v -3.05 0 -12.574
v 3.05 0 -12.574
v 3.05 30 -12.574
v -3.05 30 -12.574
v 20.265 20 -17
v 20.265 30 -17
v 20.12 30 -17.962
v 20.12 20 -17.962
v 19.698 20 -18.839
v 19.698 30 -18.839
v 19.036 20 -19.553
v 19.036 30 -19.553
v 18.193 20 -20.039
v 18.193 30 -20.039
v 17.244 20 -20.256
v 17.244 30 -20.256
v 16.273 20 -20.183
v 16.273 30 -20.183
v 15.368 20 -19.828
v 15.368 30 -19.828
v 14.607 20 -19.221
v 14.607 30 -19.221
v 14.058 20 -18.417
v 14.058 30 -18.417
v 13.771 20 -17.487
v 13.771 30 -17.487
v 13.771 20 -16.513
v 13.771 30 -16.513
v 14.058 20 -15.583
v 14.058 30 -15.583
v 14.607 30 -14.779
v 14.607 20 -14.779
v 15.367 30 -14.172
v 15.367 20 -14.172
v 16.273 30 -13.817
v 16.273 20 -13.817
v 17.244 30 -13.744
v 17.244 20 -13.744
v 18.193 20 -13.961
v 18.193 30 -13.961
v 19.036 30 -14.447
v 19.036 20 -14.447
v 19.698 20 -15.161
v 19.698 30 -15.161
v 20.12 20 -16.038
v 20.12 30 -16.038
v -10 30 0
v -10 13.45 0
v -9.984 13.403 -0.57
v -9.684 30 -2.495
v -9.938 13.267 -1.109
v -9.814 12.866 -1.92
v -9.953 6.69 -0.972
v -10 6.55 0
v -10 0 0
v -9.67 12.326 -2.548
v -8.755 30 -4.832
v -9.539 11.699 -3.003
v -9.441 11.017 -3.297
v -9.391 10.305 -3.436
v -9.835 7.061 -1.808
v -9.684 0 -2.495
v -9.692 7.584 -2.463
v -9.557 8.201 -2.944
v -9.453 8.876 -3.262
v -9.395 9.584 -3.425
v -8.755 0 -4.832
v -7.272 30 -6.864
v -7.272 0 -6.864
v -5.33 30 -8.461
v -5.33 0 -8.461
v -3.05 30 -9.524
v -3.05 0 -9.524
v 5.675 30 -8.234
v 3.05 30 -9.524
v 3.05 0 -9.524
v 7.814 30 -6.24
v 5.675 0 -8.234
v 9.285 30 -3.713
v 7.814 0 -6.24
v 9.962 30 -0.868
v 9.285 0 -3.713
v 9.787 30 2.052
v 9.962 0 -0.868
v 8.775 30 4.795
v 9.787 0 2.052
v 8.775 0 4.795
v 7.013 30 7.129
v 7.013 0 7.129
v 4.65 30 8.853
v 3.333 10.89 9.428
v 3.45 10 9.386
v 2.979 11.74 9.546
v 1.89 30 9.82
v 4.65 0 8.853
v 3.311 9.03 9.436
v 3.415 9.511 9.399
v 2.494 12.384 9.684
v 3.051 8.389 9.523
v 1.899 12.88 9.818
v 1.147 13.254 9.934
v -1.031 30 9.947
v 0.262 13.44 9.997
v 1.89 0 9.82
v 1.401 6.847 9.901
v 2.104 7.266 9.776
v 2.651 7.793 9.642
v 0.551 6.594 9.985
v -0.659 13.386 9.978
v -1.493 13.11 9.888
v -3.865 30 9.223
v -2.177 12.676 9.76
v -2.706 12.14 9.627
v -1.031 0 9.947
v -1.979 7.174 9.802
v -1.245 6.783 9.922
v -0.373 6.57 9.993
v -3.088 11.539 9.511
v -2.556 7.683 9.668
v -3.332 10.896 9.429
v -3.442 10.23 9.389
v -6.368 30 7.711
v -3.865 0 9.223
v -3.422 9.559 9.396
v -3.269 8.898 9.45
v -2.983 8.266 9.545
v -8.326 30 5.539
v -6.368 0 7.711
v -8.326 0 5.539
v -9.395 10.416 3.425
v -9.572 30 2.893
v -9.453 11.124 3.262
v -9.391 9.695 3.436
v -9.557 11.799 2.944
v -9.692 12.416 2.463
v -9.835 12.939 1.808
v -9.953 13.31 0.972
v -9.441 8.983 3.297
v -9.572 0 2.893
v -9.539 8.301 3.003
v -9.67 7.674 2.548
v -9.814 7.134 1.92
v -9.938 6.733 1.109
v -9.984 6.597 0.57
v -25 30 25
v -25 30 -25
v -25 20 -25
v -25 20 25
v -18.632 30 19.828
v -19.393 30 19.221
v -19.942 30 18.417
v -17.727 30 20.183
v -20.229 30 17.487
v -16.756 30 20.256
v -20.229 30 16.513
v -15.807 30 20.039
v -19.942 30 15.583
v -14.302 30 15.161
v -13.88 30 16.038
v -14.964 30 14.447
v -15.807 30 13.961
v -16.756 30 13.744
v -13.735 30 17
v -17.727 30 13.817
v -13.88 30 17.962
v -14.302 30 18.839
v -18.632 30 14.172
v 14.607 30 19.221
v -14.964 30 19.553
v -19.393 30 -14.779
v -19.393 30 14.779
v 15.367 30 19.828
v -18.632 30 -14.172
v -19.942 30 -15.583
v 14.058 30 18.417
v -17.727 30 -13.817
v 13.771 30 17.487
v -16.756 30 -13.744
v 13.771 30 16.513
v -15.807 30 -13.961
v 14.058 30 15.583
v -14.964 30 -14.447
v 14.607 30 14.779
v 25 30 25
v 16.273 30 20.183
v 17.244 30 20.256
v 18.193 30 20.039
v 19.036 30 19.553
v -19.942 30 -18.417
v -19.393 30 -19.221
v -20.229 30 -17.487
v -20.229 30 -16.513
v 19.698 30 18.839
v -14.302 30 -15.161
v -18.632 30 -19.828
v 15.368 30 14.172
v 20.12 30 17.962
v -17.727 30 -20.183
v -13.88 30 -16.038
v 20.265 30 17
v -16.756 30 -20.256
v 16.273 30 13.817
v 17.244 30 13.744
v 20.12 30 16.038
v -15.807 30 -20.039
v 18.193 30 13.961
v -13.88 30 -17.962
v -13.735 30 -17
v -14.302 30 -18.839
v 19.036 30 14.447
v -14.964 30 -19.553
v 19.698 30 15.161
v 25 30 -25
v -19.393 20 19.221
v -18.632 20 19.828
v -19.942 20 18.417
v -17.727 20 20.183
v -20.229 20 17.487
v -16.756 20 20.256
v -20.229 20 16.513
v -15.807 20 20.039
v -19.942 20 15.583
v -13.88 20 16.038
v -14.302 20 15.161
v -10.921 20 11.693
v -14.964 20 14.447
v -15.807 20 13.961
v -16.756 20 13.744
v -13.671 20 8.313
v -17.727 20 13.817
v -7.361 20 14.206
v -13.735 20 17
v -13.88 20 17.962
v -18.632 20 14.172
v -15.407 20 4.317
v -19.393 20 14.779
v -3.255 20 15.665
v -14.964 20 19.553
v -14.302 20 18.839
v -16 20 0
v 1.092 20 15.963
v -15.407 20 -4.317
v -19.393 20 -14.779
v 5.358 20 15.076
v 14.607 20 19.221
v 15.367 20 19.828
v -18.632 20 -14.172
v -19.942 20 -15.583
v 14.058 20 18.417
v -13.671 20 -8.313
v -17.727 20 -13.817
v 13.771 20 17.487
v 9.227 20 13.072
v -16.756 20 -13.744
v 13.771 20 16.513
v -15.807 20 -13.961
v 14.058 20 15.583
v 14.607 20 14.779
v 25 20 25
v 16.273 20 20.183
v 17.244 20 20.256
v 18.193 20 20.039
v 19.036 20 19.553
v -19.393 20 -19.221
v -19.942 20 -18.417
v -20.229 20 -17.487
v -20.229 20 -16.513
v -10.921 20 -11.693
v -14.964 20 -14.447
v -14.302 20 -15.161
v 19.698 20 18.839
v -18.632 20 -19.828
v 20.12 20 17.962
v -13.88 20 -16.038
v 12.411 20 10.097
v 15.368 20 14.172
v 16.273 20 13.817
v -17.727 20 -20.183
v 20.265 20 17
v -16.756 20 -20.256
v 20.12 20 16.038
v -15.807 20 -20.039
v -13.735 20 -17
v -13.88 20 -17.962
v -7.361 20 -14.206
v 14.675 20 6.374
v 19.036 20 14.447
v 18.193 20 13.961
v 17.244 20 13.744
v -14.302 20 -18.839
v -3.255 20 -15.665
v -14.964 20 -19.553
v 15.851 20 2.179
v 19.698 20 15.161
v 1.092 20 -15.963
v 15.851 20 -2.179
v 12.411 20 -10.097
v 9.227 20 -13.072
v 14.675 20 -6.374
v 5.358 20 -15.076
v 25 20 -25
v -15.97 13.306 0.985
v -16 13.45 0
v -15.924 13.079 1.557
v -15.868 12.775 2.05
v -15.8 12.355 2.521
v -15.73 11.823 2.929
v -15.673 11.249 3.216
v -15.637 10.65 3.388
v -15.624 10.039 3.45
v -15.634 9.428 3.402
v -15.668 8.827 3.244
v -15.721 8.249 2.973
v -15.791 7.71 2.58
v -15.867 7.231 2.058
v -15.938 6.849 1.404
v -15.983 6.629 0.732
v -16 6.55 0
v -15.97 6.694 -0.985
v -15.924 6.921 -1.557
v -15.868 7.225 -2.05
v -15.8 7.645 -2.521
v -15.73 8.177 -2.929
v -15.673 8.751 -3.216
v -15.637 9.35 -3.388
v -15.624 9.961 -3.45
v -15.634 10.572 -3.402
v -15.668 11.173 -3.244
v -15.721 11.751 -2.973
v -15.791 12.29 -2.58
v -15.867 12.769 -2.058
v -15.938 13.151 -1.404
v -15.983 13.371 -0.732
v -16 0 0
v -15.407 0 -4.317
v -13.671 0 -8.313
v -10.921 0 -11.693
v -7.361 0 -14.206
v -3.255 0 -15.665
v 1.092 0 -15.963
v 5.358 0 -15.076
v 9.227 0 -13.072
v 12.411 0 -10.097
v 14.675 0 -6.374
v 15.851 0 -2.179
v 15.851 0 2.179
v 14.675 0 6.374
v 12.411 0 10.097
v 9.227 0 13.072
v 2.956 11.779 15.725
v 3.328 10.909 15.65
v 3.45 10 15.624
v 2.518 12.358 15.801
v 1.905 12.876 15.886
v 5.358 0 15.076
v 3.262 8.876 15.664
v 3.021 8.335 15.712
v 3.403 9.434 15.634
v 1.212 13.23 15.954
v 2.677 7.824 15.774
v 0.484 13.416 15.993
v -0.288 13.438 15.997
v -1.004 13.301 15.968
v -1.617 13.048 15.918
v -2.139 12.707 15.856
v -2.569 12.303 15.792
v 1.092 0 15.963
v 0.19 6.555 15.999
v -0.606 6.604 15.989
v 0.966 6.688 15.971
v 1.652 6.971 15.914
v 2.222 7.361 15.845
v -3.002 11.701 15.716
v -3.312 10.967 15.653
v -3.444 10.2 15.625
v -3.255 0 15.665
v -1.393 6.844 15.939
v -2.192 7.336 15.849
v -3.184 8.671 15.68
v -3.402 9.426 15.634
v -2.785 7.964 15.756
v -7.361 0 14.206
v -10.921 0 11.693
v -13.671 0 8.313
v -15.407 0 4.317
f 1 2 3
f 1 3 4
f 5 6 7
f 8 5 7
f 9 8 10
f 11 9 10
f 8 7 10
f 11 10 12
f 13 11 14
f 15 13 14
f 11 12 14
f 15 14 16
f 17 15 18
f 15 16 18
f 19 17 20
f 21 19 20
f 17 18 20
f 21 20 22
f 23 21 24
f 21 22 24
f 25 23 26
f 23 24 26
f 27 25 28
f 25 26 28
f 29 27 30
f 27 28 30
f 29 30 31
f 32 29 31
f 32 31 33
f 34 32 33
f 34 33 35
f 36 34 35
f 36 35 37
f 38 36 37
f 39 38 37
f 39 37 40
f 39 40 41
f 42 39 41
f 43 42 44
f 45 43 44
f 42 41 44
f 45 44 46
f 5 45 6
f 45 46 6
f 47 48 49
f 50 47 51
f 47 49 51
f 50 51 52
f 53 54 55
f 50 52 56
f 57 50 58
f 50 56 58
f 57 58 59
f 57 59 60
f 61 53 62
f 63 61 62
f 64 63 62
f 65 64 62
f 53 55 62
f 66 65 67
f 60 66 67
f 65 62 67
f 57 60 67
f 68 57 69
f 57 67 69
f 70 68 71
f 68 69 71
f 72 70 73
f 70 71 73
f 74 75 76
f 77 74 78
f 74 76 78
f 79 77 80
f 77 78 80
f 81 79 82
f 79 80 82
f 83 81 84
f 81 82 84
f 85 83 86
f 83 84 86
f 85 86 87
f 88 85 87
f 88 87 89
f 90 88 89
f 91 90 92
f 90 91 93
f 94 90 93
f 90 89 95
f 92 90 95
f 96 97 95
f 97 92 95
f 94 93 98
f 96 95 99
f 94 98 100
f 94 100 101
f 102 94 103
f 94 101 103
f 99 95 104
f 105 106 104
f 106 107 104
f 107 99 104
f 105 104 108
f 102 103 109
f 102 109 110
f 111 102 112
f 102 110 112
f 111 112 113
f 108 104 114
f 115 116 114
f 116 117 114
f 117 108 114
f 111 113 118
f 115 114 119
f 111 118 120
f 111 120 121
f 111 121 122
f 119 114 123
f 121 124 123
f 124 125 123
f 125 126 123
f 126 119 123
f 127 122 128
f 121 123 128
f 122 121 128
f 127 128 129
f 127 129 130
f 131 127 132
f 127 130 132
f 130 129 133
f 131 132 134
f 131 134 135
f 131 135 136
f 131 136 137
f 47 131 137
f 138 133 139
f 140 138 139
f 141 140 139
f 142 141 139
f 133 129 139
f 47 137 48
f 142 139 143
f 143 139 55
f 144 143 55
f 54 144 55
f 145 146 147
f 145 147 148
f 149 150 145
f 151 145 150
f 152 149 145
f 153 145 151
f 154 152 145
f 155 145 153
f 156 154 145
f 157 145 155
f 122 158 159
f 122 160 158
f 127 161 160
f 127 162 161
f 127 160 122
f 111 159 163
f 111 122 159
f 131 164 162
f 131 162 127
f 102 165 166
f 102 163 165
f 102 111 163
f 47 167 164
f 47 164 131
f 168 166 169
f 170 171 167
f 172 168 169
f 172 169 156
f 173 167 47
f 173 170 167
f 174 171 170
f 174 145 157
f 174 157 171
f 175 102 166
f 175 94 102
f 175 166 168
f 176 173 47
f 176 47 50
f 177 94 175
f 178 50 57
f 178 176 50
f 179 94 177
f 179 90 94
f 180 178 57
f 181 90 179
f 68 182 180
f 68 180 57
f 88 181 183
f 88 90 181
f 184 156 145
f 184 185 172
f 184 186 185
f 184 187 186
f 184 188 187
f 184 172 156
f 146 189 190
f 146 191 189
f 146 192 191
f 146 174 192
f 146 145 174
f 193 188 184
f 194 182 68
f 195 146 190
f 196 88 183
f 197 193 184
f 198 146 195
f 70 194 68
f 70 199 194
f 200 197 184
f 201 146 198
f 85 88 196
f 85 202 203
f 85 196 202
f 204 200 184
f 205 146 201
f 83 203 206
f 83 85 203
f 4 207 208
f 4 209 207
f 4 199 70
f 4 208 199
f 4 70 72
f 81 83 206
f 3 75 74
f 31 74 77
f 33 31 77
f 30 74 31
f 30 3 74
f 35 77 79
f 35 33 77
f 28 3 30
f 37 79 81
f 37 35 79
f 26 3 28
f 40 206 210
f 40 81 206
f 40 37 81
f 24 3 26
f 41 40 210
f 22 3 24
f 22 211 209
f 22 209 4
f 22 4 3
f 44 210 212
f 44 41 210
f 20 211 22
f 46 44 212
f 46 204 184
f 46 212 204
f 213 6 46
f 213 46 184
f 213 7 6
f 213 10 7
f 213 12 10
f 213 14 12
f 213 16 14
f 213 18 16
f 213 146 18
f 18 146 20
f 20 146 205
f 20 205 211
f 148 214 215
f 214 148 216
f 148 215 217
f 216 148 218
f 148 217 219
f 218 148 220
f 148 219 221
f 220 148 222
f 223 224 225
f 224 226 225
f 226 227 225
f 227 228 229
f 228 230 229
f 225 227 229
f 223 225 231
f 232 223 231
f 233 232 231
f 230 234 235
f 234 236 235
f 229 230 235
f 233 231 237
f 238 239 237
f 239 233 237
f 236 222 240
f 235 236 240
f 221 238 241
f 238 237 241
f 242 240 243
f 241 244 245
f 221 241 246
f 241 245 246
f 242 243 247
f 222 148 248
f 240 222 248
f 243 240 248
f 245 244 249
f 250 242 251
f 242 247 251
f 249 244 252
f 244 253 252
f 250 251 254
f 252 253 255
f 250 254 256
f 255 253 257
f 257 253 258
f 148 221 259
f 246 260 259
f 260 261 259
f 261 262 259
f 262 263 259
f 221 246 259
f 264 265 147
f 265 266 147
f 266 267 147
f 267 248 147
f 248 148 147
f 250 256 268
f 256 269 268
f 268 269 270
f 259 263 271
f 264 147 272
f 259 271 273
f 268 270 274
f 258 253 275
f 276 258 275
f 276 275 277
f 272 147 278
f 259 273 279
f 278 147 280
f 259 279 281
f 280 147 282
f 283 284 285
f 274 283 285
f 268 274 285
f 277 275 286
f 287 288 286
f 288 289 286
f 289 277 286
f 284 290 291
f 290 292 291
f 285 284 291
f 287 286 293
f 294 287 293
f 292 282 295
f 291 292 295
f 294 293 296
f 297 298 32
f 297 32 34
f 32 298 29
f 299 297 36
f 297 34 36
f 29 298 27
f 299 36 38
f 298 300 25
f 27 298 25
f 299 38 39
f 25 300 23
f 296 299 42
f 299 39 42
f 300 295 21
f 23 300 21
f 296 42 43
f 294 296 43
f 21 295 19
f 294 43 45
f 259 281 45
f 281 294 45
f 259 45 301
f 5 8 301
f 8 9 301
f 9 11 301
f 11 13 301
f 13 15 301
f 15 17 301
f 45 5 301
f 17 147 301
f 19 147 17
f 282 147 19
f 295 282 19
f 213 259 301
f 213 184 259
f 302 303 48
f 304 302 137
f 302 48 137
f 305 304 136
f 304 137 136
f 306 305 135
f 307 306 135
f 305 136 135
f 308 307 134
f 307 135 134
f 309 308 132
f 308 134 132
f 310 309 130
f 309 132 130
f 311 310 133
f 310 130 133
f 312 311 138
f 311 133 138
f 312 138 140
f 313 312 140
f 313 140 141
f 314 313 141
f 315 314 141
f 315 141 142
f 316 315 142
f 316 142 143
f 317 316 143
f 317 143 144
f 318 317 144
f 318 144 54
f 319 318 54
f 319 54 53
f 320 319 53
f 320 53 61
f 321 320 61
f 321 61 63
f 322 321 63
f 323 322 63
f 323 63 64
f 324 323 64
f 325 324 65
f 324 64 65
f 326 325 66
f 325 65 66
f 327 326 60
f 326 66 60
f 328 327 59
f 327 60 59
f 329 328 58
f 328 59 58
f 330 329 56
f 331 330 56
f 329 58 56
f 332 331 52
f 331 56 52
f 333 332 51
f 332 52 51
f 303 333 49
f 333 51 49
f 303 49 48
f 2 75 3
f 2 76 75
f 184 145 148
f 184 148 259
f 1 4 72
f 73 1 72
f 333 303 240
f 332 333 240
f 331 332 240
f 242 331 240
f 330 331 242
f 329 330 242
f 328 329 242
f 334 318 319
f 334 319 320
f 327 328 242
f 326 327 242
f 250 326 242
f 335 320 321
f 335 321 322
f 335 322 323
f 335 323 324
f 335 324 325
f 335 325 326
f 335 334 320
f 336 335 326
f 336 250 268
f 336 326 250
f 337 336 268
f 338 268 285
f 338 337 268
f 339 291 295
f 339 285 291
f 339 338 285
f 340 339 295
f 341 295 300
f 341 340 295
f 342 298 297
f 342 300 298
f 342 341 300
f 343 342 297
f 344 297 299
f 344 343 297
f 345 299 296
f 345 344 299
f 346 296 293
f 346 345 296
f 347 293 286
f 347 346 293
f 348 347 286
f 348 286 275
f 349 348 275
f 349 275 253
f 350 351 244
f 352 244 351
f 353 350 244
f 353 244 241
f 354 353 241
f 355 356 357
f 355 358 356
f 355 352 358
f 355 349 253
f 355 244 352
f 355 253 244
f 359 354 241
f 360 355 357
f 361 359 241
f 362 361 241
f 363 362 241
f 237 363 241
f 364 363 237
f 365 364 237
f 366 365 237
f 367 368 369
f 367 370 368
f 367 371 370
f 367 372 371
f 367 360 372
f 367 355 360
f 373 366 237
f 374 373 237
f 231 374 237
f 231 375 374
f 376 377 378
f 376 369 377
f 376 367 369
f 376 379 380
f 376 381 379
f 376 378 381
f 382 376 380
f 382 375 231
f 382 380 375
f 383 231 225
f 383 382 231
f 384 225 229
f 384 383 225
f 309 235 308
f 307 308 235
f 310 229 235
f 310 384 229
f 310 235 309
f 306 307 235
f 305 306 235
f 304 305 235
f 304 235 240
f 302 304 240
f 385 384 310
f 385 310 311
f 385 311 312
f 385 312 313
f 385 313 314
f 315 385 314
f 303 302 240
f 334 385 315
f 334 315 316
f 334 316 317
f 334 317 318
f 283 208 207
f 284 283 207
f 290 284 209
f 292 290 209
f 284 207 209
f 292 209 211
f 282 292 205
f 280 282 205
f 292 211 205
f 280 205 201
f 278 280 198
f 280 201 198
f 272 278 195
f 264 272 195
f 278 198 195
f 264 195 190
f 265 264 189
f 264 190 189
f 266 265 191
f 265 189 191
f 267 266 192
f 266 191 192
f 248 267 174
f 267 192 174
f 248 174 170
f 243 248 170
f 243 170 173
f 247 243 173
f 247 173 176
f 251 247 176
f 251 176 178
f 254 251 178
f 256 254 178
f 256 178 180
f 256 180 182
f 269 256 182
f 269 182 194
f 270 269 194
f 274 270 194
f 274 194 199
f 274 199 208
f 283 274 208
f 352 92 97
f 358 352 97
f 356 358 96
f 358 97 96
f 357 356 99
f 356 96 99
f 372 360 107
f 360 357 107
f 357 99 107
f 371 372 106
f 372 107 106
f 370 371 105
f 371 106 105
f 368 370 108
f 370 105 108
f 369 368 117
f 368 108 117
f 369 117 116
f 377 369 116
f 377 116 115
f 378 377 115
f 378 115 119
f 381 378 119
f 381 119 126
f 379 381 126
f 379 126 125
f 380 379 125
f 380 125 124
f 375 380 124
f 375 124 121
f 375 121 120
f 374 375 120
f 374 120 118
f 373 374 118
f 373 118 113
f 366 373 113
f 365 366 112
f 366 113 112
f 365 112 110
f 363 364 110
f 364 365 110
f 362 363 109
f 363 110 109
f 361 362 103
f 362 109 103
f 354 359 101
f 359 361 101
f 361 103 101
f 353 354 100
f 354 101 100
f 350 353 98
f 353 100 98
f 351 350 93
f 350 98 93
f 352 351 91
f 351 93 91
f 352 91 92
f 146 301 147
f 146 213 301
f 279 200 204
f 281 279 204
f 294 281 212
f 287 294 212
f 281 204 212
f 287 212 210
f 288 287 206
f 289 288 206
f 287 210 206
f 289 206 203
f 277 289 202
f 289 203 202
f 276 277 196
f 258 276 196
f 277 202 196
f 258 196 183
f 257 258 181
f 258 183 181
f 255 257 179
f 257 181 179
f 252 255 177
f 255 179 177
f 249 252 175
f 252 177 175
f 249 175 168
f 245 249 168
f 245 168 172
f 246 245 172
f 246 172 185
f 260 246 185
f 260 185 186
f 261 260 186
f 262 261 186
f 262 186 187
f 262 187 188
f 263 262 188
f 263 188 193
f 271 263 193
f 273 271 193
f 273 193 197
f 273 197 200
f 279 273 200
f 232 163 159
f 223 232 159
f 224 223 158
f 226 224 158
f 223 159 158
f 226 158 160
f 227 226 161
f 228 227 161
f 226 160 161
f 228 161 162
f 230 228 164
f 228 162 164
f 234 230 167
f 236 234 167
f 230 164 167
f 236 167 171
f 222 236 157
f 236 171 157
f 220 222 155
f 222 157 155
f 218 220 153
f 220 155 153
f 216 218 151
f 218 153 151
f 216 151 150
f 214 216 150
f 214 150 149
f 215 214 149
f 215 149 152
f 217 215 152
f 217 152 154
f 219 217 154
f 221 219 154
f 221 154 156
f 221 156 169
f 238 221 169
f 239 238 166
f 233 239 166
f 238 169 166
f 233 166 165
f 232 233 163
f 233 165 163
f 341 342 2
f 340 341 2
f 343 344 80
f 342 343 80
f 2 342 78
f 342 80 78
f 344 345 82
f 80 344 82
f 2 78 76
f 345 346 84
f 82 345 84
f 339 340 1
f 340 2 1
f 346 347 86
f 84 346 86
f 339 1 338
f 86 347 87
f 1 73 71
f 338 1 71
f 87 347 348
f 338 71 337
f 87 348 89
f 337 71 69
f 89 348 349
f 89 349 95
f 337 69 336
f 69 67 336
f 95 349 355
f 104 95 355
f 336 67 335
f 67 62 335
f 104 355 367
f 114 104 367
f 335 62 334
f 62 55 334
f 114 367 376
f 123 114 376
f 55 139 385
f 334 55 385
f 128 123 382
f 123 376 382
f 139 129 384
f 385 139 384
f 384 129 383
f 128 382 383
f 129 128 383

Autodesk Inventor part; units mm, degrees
ref_plane "YZ Plane" through (0, 0, 0) normal (1, 0, 0) x (0, 1, 0)
ref_plane "XZ Plane" through (0, 0, 0) normal (0, 1, 0) x (-1, 0, 0)
ref_plane "XY Plane" through (0, 0, 0) normal (0, 0, 1) x (1, 0, 0)
sketch "Sketch1" plane through (0, 0, 0) normal (0, 1, 0) x (-1, 0, 0)
  circle A0 centre (0, 0) radius 10
  circle A1 centre (0, 0) radius 16
  dimension "d0" = 20
  dimension "d1" = 32
extrude "Extrusion1" add sketch "Sketch1" along normal blind 30
sketch "Sketch4" plane through (0, 0, 0) normal (0, 0, 1) x (1, 0, 0)
  circle A0 centre (0, 10) radius 3.45
  line L0 (-16, 0) -> (16, 0) projected
  point P0 (0, 0)
  dimension "d13" = 6.9
  dimension "d14" = 10
extrude "Extrusion4" cut sketch "Sketch4" along normal blind 30
sketch "Sketch5" plane through (0, 0, 0) normal (1, 0, 0) x (0, 1, 0)
  circle A0 centre (10, 0) radius 3.45
  line L0 (0, 16) -> (0, -16) projected
  point P0 (0, 0)
  dimension "d17" = 6.9
  dimension "d18" = 10
extrude "Extrusion5" cut sketch "Sketch5" against normal blind 30
sketch "Sketch6" plane through (0, 0, 0) normal (0, -1, 0) x (1, 0, 0)
  line L0 (-3.05, -9.5235) -> (3.05, -9.5235)
  line L1 (3.05, -9.5235) -> (3.05, -12.5735)
  line L2 (3.05, -12.5735) -> (-3.05, -12.5735)
  line L3 (-3.05, -12.5735) -> (-3.05, -9.5235)
  circle A0 centre (0, 0) radius 10 projected
  dimension "d21" = 6.1
  dimension "d22" = 3.05
extrude "Extrusion6" cut sketch "Sketch6" against normal through all contours A0 L1 L2 L3 | L0 A0 picked at (0.3438, -9.6646)
sketch "Sketch9" plane through (0, 30, 0) normal (0, 1, 0) x (1, 0, 0)
  line L0 (-25, -25) -> (25, -25)
  line L1 (25, -25) -> (25, 25)
  line L2 (25, 25) -> (-25, 25)
  line L3 (-25, 25) -> (-25, -25)
  circle A0 centre (-17, -17) radius 3.265
  circle A1 centre (-17, 17) radius 3.265
  circle A2 centre (17, -17) radius 3.265
  circle A3 centre (17, 17) radius 3.265
  circle A4 centre (0, 0) radius 16
  dimension "d25" = 50
  dimension "d26" = 50
  dimension "d27" = 25
  dimension "d28" = 25
  dimension "d29" = 6.53
  dimension "d30" = 8
  dimension "d31" = 8
  dimension "d32" = 8
  dimension "d33" = 8
  dimension "d35" = 8
  dimension "d36" = 8
  dimension "d37" = 8
  dimension "d38" = 8
extrude "Extrusion7" add sketch "Sketch9" against normal blind 10
properties part number "1225a_Pinion Collar_V1" material "Aluminum 6061"
